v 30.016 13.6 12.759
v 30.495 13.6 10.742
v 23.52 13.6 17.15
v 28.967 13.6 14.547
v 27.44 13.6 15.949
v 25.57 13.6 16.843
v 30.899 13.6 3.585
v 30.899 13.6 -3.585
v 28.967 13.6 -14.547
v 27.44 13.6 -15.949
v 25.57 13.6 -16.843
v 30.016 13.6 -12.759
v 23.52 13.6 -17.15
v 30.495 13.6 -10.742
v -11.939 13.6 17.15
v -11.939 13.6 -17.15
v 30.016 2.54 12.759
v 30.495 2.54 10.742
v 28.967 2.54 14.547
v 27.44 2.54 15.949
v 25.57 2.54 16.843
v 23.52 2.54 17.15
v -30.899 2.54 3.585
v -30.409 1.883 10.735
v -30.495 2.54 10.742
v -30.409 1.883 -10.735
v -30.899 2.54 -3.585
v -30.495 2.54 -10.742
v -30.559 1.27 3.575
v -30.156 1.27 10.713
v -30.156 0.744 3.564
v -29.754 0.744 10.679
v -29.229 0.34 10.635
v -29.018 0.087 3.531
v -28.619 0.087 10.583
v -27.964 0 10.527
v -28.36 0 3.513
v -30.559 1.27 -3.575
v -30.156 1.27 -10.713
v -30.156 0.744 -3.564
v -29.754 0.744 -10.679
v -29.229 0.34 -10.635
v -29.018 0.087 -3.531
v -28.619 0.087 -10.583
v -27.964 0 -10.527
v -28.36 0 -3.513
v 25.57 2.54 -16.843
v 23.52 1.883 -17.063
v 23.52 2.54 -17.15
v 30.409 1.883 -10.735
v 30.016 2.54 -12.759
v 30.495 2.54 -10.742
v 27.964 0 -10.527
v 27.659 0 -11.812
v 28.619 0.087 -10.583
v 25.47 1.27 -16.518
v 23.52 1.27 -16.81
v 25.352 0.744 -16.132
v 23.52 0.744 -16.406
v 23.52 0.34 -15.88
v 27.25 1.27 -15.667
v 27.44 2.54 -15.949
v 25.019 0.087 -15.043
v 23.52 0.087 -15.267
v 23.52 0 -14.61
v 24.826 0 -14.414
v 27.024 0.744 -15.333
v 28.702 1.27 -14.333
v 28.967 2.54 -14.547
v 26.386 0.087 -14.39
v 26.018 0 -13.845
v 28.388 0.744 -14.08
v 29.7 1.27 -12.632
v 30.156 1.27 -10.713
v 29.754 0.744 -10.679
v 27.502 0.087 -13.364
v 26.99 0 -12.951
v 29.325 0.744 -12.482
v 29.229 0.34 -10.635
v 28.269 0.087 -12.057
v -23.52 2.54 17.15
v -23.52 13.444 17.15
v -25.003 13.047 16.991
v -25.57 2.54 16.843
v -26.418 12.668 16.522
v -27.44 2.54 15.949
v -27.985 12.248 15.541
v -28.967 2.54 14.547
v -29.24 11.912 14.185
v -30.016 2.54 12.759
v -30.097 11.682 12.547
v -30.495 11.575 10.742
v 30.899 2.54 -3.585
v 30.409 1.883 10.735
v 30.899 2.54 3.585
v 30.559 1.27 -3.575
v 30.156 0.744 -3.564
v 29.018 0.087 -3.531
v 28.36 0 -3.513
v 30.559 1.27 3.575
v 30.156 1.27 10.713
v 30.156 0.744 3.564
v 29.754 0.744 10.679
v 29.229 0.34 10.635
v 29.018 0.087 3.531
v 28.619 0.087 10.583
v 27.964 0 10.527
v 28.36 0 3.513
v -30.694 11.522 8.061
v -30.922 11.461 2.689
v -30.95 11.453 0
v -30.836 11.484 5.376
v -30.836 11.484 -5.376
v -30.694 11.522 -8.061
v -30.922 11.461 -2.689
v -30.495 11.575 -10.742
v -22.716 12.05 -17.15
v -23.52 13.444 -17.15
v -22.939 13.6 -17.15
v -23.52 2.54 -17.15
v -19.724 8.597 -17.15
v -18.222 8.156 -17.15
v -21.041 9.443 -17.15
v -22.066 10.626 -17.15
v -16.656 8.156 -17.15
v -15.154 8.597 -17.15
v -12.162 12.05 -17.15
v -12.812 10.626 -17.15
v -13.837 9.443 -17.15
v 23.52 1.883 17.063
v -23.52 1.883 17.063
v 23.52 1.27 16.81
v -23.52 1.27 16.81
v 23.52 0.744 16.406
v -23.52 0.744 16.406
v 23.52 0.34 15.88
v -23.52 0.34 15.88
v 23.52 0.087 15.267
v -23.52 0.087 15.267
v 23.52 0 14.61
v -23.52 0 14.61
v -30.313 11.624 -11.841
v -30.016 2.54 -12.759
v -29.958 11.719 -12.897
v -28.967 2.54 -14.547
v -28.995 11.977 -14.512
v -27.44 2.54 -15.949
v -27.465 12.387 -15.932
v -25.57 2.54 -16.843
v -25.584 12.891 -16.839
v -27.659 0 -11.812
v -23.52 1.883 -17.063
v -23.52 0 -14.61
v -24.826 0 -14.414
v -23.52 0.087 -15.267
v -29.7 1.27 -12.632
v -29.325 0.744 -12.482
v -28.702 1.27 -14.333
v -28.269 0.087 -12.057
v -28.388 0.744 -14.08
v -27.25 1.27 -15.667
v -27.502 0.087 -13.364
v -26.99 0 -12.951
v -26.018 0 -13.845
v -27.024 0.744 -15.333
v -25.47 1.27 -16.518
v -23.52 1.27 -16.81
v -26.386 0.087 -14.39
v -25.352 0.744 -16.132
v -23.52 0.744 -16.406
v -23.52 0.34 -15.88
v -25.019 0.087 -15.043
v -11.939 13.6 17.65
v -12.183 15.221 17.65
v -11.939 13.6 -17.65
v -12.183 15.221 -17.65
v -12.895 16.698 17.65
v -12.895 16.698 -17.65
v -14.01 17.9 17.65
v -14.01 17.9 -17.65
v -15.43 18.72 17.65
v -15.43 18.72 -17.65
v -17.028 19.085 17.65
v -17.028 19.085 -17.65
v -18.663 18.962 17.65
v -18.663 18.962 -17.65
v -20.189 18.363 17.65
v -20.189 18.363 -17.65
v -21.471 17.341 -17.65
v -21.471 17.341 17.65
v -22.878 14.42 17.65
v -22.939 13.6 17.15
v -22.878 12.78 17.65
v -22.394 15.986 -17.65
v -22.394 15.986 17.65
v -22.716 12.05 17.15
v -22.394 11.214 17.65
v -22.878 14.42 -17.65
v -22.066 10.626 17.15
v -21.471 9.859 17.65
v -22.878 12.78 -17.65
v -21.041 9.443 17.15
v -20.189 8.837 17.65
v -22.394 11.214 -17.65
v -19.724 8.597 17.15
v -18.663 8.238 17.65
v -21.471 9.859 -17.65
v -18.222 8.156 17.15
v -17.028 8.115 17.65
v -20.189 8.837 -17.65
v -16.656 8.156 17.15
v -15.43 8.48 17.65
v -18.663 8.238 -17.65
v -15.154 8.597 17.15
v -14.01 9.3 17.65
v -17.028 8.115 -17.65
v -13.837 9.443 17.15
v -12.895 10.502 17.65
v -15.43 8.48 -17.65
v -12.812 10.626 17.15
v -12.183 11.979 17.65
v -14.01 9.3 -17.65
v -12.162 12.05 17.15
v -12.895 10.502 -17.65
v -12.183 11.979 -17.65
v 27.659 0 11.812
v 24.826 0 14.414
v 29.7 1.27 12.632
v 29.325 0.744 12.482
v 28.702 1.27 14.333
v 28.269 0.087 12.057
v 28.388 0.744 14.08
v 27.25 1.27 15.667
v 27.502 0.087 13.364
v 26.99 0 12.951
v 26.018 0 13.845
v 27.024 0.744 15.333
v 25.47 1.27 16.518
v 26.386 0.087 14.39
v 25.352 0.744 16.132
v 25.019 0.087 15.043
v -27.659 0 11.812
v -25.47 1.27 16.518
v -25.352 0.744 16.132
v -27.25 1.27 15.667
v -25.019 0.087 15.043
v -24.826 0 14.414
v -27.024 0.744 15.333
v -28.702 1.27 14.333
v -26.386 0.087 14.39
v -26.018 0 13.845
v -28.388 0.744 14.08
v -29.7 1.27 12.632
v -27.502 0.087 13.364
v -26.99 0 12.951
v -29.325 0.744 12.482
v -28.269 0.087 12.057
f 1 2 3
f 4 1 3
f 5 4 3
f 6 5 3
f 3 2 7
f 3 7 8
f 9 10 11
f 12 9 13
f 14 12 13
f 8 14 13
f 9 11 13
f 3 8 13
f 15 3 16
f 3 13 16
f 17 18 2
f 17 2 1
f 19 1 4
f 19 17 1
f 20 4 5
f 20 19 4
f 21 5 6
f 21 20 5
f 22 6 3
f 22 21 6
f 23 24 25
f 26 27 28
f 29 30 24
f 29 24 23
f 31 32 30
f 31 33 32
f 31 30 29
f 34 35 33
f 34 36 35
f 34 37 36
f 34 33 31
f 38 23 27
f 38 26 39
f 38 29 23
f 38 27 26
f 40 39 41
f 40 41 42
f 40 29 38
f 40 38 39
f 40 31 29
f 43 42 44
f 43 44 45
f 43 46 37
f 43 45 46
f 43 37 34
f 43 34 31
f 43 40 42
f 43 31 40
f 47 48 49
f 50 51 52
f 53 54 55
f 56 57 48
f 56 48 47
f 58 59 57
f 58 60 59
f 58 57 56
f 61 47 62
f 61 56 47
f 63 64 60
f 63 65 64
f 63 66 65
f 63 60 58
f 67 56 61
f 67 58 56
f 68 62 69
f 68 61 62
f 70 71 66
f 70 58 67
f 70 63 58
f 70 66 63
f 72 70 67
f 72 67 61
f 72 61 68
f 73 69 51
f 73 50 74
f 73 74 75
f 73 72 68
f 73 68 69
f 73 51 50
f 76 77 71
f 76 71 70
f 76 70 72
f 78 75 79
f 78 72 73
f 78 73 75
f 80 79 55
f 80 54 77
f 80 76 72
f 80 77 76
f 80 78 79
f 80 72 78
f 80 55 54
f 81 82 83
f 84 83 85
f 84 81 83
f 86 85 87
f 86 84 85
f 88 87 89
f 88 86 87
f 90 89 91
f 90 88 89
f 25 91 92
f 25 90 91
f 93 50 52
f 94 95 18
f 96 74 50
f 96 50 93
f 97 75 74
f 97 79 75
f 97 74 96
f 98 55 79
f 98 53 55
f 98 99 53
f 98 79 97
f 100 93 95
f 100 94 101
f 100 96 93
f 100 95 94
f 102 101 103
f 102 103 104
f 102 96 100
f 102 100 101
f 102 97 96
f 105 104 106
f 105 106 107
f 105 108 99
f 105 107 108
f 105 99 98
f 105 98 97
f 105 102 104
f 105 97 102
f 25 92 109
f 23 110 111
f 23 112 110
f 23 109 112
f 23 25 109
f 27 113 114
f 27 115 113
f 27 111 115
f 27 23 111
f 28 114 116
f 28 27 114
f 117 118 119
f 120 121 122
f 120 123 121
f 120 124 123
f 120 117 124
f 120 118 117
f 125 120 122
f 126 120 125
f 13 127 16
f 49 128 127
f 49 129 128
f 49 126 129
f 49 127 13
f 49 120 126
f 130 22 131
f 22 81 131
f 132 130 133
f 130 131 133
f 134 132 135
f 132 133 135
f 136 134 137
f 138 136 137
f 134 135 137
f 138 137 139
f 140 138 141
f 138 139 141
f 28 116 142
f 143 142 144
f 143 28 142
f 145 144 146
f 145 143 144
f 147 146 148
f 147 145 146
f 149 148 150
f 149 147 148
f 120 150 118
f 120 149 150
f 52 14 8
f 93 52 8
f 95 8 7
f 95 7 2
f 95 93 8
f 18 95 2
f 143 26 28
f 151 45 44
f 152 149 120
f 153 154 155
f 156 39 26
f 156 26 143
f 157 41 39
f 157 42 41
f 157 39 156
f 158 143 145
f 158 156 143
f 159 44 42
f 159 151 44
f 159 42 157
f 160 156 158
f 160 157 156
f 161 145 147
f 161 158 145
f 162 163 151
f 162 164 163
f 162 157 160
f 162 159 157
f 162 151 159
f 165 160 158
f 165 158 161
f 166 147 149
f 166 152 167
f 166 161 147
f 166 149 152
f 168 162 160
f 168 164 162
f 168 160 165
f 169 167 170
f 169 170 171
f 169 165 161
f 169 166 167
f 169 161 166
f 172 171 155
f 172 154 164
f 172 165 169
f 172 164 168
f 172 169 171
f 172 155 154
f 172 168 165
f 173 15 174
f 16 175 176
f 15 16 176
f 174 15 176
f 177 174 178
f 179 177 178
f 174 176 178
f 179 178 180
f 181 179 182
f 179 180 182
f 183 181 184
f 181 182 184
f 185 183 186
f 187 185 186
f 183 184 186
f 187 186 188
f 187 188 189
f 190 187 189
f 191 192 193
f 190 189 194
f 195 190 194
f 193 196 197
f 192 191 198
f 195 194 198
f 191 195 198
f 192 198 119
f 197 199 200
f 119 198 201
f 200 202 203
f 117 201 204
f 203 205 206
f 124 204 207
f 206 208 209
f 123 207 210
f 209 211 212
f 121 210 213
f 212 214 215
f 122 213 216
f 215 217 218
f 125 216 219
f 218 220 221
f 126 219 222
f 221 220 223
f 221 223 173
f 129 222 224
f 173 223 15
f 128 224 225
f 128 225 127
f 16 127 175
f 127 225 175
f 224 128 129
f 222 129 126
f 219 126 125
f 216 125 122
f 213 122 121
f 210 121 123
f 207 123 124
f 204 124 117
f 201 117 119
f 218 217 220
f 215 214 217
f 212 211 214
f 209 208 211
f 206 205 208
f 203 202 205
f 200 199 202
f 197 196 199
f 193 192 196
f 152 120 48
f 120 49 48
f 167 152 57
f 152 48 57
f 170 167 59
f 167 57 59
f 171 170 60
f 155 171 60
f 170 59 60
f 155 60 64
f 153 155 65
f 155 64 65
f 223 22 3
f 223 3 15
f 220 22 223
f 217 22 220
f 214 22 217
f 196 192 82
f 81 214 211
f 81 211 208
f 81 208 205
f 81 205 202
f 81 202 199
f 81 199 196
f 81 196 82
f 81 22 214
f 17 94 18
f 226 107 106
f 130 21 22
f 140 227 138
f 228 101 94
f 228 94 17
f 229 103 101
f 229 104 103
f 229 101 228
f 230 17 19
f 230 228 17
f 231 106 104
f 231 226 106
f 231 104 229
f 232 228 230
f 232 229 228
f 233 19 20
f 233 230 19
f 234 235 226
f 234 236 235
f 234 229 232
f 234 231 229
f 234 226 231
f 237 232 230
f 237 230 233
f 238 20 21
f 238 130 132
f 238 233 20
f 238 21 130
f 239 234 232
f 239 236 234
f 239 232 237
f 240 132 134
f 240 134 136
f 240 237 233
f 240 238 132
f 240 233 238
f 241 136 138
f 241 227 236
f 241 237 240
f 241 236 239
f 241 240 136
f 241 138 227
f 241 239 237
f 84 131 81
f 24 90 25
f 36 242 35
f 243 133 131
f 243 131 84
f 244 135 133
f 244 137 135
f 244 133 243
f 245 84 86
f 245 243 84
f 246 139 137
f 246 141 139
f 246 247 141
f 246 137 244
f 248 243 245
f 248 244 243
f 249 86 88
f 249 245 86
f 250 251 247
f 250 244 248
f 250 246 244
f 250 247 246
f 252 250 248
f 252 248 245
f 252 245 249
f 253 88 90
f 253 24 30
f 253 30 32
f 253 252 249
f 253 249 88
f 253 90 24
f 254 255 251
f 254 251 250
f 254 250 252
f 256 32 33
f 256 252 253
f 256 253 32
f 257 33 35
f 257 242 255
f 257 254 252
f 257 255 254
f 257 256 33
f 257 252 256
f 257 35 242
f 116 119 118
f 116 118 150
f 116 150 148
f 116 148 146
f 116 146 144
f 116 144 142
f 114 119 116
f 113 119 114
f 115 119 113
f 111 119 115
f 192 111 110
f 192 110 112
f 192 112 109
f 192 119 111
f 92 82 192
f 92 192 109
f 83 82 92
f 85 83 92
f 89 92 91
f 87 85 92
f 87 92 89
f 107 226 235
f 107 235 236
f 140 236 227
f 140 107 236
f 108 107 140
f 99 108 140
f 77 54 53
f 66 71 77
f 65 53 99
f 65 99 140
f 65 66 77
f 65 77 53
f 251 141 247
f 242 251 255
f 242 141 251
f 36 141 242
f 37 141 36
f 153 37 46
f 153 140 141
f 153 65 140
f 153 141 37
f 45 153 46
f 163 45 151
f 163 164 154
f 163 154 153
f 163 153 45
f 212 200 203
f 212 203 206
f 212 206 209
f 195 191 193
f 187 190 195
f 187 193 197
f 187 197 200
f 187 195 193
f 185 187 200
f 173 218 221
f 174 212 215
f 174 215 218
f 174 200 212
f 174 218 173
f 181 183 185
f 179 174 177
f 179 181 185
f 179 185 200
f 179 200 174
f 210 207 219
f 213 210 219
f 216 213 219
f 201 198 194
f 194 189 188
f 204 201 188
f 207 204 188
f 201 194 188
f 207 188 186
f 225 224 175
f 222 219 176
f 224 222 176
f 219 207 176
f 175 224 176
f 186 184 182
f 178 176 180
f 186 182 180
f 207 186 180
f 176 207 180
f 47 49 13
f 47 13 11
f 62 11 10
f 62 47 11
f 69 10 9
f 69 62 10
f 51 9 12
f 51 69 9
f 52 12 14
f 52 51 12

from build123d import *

# Parameters (mm, degrees)
BOSS_EXTRUDE1_DEPTH      = 13.6
FILLET1_R                = 2.54
BOSS_EXTRUDE2_DEPTH      = 0.5
BOSS_EXTRUDE2_DEPTH_BACK = 34.8
SKETCH3_R                = 5.5
CUT_EXTRUDE2_DEPTH       = 51.336393456


with BuildPart() as part:
    # Sketch1 → Boss-Extrude1 (new body)
    with BuildSketch(Plane(origin=(0, 0, 0), x_dir=(1, 0, 0), z_dir=(0, 1, 0))):
        with BuildLine():
            Line((-23.519969056, 17.15), (23.519969056, 17.15))
            ThreePointArc((23.519969056, 17.15), (28.255759205, 15.304831876), (30.494883917, 10.742083333))
            ThreePointArc((30.494883917, 10.742083333), (30.95, 0), (30.494883917, -10.742083333))
            ThreePointArc((30.494883917, -10.742083333), (28.255759205, -15.304831876), (23.519969056, -17.15))
            Line((23.519969056, -17.15), (-23.519969056, -17.15))
            ThreePointArc((-23.519969056, -17.15), (-28.255759205, -15.304831876), (-30.494883917, -10.742083333))
            ThreePointArc((-30.494883917, -10.742083333), (-30.95, 0), (-30.494883917, 10.742083333))
            ThreePointArc((-30.494883917, 10.742083333), (-28.255759205, 15.304831876), (-23.519969056, 17.15))
        make_face()
    extrude(amount=BOSS_EXTRUDE1_DEPTH)

    # Fillet1
    fillet1_edges = [part.edges().sort_by_distance(p)[0] for p in [
        (-30.95, 0, 0),
        (-28.255759205, 0, -15.304831876),
        (0, 0, -17.15),
        (28.255759205, 0, -15.304831876),
        (30.95, 0, 0),
        (28.255759205, 0, 15.304831876),
        (0, 0, 17.15),
        (-28.255759205, 0, 15.304831876),
    ]]
    fillet(fillet1_edges, radius=FILLET1_R)

    # Sketch3 → Boss-Extrude2 (add, two sides: drawn at the far end of the back side and taken through both)
    with BuildSketch(Plane.XY.offset(17.15).offset(-BOSS_EXTRUDE2_DEPTH_BACK)):
        with Locations((-17.438993952, 13.6)):
            Circle(SKETCH3_R)
    extrude(amount=BOSS_EXTRUDE2_DEPTH + BOSS_EXTRUDE2_DEPTH_BACK)

    # Sketch5 → Cut-Extrude2 (cut, through all)
    with BuildSketch(Plane.XY.offset(17.15)):
        Polygon((-22.938993952, 13.6), (-30.95, 11.453457399), (-30.95, 13.6), align=None)
    extrude(amount=-CUT_EXTRUDE2_DEPTH, mode=Mode.SUBTRACT)


solid = part.part
